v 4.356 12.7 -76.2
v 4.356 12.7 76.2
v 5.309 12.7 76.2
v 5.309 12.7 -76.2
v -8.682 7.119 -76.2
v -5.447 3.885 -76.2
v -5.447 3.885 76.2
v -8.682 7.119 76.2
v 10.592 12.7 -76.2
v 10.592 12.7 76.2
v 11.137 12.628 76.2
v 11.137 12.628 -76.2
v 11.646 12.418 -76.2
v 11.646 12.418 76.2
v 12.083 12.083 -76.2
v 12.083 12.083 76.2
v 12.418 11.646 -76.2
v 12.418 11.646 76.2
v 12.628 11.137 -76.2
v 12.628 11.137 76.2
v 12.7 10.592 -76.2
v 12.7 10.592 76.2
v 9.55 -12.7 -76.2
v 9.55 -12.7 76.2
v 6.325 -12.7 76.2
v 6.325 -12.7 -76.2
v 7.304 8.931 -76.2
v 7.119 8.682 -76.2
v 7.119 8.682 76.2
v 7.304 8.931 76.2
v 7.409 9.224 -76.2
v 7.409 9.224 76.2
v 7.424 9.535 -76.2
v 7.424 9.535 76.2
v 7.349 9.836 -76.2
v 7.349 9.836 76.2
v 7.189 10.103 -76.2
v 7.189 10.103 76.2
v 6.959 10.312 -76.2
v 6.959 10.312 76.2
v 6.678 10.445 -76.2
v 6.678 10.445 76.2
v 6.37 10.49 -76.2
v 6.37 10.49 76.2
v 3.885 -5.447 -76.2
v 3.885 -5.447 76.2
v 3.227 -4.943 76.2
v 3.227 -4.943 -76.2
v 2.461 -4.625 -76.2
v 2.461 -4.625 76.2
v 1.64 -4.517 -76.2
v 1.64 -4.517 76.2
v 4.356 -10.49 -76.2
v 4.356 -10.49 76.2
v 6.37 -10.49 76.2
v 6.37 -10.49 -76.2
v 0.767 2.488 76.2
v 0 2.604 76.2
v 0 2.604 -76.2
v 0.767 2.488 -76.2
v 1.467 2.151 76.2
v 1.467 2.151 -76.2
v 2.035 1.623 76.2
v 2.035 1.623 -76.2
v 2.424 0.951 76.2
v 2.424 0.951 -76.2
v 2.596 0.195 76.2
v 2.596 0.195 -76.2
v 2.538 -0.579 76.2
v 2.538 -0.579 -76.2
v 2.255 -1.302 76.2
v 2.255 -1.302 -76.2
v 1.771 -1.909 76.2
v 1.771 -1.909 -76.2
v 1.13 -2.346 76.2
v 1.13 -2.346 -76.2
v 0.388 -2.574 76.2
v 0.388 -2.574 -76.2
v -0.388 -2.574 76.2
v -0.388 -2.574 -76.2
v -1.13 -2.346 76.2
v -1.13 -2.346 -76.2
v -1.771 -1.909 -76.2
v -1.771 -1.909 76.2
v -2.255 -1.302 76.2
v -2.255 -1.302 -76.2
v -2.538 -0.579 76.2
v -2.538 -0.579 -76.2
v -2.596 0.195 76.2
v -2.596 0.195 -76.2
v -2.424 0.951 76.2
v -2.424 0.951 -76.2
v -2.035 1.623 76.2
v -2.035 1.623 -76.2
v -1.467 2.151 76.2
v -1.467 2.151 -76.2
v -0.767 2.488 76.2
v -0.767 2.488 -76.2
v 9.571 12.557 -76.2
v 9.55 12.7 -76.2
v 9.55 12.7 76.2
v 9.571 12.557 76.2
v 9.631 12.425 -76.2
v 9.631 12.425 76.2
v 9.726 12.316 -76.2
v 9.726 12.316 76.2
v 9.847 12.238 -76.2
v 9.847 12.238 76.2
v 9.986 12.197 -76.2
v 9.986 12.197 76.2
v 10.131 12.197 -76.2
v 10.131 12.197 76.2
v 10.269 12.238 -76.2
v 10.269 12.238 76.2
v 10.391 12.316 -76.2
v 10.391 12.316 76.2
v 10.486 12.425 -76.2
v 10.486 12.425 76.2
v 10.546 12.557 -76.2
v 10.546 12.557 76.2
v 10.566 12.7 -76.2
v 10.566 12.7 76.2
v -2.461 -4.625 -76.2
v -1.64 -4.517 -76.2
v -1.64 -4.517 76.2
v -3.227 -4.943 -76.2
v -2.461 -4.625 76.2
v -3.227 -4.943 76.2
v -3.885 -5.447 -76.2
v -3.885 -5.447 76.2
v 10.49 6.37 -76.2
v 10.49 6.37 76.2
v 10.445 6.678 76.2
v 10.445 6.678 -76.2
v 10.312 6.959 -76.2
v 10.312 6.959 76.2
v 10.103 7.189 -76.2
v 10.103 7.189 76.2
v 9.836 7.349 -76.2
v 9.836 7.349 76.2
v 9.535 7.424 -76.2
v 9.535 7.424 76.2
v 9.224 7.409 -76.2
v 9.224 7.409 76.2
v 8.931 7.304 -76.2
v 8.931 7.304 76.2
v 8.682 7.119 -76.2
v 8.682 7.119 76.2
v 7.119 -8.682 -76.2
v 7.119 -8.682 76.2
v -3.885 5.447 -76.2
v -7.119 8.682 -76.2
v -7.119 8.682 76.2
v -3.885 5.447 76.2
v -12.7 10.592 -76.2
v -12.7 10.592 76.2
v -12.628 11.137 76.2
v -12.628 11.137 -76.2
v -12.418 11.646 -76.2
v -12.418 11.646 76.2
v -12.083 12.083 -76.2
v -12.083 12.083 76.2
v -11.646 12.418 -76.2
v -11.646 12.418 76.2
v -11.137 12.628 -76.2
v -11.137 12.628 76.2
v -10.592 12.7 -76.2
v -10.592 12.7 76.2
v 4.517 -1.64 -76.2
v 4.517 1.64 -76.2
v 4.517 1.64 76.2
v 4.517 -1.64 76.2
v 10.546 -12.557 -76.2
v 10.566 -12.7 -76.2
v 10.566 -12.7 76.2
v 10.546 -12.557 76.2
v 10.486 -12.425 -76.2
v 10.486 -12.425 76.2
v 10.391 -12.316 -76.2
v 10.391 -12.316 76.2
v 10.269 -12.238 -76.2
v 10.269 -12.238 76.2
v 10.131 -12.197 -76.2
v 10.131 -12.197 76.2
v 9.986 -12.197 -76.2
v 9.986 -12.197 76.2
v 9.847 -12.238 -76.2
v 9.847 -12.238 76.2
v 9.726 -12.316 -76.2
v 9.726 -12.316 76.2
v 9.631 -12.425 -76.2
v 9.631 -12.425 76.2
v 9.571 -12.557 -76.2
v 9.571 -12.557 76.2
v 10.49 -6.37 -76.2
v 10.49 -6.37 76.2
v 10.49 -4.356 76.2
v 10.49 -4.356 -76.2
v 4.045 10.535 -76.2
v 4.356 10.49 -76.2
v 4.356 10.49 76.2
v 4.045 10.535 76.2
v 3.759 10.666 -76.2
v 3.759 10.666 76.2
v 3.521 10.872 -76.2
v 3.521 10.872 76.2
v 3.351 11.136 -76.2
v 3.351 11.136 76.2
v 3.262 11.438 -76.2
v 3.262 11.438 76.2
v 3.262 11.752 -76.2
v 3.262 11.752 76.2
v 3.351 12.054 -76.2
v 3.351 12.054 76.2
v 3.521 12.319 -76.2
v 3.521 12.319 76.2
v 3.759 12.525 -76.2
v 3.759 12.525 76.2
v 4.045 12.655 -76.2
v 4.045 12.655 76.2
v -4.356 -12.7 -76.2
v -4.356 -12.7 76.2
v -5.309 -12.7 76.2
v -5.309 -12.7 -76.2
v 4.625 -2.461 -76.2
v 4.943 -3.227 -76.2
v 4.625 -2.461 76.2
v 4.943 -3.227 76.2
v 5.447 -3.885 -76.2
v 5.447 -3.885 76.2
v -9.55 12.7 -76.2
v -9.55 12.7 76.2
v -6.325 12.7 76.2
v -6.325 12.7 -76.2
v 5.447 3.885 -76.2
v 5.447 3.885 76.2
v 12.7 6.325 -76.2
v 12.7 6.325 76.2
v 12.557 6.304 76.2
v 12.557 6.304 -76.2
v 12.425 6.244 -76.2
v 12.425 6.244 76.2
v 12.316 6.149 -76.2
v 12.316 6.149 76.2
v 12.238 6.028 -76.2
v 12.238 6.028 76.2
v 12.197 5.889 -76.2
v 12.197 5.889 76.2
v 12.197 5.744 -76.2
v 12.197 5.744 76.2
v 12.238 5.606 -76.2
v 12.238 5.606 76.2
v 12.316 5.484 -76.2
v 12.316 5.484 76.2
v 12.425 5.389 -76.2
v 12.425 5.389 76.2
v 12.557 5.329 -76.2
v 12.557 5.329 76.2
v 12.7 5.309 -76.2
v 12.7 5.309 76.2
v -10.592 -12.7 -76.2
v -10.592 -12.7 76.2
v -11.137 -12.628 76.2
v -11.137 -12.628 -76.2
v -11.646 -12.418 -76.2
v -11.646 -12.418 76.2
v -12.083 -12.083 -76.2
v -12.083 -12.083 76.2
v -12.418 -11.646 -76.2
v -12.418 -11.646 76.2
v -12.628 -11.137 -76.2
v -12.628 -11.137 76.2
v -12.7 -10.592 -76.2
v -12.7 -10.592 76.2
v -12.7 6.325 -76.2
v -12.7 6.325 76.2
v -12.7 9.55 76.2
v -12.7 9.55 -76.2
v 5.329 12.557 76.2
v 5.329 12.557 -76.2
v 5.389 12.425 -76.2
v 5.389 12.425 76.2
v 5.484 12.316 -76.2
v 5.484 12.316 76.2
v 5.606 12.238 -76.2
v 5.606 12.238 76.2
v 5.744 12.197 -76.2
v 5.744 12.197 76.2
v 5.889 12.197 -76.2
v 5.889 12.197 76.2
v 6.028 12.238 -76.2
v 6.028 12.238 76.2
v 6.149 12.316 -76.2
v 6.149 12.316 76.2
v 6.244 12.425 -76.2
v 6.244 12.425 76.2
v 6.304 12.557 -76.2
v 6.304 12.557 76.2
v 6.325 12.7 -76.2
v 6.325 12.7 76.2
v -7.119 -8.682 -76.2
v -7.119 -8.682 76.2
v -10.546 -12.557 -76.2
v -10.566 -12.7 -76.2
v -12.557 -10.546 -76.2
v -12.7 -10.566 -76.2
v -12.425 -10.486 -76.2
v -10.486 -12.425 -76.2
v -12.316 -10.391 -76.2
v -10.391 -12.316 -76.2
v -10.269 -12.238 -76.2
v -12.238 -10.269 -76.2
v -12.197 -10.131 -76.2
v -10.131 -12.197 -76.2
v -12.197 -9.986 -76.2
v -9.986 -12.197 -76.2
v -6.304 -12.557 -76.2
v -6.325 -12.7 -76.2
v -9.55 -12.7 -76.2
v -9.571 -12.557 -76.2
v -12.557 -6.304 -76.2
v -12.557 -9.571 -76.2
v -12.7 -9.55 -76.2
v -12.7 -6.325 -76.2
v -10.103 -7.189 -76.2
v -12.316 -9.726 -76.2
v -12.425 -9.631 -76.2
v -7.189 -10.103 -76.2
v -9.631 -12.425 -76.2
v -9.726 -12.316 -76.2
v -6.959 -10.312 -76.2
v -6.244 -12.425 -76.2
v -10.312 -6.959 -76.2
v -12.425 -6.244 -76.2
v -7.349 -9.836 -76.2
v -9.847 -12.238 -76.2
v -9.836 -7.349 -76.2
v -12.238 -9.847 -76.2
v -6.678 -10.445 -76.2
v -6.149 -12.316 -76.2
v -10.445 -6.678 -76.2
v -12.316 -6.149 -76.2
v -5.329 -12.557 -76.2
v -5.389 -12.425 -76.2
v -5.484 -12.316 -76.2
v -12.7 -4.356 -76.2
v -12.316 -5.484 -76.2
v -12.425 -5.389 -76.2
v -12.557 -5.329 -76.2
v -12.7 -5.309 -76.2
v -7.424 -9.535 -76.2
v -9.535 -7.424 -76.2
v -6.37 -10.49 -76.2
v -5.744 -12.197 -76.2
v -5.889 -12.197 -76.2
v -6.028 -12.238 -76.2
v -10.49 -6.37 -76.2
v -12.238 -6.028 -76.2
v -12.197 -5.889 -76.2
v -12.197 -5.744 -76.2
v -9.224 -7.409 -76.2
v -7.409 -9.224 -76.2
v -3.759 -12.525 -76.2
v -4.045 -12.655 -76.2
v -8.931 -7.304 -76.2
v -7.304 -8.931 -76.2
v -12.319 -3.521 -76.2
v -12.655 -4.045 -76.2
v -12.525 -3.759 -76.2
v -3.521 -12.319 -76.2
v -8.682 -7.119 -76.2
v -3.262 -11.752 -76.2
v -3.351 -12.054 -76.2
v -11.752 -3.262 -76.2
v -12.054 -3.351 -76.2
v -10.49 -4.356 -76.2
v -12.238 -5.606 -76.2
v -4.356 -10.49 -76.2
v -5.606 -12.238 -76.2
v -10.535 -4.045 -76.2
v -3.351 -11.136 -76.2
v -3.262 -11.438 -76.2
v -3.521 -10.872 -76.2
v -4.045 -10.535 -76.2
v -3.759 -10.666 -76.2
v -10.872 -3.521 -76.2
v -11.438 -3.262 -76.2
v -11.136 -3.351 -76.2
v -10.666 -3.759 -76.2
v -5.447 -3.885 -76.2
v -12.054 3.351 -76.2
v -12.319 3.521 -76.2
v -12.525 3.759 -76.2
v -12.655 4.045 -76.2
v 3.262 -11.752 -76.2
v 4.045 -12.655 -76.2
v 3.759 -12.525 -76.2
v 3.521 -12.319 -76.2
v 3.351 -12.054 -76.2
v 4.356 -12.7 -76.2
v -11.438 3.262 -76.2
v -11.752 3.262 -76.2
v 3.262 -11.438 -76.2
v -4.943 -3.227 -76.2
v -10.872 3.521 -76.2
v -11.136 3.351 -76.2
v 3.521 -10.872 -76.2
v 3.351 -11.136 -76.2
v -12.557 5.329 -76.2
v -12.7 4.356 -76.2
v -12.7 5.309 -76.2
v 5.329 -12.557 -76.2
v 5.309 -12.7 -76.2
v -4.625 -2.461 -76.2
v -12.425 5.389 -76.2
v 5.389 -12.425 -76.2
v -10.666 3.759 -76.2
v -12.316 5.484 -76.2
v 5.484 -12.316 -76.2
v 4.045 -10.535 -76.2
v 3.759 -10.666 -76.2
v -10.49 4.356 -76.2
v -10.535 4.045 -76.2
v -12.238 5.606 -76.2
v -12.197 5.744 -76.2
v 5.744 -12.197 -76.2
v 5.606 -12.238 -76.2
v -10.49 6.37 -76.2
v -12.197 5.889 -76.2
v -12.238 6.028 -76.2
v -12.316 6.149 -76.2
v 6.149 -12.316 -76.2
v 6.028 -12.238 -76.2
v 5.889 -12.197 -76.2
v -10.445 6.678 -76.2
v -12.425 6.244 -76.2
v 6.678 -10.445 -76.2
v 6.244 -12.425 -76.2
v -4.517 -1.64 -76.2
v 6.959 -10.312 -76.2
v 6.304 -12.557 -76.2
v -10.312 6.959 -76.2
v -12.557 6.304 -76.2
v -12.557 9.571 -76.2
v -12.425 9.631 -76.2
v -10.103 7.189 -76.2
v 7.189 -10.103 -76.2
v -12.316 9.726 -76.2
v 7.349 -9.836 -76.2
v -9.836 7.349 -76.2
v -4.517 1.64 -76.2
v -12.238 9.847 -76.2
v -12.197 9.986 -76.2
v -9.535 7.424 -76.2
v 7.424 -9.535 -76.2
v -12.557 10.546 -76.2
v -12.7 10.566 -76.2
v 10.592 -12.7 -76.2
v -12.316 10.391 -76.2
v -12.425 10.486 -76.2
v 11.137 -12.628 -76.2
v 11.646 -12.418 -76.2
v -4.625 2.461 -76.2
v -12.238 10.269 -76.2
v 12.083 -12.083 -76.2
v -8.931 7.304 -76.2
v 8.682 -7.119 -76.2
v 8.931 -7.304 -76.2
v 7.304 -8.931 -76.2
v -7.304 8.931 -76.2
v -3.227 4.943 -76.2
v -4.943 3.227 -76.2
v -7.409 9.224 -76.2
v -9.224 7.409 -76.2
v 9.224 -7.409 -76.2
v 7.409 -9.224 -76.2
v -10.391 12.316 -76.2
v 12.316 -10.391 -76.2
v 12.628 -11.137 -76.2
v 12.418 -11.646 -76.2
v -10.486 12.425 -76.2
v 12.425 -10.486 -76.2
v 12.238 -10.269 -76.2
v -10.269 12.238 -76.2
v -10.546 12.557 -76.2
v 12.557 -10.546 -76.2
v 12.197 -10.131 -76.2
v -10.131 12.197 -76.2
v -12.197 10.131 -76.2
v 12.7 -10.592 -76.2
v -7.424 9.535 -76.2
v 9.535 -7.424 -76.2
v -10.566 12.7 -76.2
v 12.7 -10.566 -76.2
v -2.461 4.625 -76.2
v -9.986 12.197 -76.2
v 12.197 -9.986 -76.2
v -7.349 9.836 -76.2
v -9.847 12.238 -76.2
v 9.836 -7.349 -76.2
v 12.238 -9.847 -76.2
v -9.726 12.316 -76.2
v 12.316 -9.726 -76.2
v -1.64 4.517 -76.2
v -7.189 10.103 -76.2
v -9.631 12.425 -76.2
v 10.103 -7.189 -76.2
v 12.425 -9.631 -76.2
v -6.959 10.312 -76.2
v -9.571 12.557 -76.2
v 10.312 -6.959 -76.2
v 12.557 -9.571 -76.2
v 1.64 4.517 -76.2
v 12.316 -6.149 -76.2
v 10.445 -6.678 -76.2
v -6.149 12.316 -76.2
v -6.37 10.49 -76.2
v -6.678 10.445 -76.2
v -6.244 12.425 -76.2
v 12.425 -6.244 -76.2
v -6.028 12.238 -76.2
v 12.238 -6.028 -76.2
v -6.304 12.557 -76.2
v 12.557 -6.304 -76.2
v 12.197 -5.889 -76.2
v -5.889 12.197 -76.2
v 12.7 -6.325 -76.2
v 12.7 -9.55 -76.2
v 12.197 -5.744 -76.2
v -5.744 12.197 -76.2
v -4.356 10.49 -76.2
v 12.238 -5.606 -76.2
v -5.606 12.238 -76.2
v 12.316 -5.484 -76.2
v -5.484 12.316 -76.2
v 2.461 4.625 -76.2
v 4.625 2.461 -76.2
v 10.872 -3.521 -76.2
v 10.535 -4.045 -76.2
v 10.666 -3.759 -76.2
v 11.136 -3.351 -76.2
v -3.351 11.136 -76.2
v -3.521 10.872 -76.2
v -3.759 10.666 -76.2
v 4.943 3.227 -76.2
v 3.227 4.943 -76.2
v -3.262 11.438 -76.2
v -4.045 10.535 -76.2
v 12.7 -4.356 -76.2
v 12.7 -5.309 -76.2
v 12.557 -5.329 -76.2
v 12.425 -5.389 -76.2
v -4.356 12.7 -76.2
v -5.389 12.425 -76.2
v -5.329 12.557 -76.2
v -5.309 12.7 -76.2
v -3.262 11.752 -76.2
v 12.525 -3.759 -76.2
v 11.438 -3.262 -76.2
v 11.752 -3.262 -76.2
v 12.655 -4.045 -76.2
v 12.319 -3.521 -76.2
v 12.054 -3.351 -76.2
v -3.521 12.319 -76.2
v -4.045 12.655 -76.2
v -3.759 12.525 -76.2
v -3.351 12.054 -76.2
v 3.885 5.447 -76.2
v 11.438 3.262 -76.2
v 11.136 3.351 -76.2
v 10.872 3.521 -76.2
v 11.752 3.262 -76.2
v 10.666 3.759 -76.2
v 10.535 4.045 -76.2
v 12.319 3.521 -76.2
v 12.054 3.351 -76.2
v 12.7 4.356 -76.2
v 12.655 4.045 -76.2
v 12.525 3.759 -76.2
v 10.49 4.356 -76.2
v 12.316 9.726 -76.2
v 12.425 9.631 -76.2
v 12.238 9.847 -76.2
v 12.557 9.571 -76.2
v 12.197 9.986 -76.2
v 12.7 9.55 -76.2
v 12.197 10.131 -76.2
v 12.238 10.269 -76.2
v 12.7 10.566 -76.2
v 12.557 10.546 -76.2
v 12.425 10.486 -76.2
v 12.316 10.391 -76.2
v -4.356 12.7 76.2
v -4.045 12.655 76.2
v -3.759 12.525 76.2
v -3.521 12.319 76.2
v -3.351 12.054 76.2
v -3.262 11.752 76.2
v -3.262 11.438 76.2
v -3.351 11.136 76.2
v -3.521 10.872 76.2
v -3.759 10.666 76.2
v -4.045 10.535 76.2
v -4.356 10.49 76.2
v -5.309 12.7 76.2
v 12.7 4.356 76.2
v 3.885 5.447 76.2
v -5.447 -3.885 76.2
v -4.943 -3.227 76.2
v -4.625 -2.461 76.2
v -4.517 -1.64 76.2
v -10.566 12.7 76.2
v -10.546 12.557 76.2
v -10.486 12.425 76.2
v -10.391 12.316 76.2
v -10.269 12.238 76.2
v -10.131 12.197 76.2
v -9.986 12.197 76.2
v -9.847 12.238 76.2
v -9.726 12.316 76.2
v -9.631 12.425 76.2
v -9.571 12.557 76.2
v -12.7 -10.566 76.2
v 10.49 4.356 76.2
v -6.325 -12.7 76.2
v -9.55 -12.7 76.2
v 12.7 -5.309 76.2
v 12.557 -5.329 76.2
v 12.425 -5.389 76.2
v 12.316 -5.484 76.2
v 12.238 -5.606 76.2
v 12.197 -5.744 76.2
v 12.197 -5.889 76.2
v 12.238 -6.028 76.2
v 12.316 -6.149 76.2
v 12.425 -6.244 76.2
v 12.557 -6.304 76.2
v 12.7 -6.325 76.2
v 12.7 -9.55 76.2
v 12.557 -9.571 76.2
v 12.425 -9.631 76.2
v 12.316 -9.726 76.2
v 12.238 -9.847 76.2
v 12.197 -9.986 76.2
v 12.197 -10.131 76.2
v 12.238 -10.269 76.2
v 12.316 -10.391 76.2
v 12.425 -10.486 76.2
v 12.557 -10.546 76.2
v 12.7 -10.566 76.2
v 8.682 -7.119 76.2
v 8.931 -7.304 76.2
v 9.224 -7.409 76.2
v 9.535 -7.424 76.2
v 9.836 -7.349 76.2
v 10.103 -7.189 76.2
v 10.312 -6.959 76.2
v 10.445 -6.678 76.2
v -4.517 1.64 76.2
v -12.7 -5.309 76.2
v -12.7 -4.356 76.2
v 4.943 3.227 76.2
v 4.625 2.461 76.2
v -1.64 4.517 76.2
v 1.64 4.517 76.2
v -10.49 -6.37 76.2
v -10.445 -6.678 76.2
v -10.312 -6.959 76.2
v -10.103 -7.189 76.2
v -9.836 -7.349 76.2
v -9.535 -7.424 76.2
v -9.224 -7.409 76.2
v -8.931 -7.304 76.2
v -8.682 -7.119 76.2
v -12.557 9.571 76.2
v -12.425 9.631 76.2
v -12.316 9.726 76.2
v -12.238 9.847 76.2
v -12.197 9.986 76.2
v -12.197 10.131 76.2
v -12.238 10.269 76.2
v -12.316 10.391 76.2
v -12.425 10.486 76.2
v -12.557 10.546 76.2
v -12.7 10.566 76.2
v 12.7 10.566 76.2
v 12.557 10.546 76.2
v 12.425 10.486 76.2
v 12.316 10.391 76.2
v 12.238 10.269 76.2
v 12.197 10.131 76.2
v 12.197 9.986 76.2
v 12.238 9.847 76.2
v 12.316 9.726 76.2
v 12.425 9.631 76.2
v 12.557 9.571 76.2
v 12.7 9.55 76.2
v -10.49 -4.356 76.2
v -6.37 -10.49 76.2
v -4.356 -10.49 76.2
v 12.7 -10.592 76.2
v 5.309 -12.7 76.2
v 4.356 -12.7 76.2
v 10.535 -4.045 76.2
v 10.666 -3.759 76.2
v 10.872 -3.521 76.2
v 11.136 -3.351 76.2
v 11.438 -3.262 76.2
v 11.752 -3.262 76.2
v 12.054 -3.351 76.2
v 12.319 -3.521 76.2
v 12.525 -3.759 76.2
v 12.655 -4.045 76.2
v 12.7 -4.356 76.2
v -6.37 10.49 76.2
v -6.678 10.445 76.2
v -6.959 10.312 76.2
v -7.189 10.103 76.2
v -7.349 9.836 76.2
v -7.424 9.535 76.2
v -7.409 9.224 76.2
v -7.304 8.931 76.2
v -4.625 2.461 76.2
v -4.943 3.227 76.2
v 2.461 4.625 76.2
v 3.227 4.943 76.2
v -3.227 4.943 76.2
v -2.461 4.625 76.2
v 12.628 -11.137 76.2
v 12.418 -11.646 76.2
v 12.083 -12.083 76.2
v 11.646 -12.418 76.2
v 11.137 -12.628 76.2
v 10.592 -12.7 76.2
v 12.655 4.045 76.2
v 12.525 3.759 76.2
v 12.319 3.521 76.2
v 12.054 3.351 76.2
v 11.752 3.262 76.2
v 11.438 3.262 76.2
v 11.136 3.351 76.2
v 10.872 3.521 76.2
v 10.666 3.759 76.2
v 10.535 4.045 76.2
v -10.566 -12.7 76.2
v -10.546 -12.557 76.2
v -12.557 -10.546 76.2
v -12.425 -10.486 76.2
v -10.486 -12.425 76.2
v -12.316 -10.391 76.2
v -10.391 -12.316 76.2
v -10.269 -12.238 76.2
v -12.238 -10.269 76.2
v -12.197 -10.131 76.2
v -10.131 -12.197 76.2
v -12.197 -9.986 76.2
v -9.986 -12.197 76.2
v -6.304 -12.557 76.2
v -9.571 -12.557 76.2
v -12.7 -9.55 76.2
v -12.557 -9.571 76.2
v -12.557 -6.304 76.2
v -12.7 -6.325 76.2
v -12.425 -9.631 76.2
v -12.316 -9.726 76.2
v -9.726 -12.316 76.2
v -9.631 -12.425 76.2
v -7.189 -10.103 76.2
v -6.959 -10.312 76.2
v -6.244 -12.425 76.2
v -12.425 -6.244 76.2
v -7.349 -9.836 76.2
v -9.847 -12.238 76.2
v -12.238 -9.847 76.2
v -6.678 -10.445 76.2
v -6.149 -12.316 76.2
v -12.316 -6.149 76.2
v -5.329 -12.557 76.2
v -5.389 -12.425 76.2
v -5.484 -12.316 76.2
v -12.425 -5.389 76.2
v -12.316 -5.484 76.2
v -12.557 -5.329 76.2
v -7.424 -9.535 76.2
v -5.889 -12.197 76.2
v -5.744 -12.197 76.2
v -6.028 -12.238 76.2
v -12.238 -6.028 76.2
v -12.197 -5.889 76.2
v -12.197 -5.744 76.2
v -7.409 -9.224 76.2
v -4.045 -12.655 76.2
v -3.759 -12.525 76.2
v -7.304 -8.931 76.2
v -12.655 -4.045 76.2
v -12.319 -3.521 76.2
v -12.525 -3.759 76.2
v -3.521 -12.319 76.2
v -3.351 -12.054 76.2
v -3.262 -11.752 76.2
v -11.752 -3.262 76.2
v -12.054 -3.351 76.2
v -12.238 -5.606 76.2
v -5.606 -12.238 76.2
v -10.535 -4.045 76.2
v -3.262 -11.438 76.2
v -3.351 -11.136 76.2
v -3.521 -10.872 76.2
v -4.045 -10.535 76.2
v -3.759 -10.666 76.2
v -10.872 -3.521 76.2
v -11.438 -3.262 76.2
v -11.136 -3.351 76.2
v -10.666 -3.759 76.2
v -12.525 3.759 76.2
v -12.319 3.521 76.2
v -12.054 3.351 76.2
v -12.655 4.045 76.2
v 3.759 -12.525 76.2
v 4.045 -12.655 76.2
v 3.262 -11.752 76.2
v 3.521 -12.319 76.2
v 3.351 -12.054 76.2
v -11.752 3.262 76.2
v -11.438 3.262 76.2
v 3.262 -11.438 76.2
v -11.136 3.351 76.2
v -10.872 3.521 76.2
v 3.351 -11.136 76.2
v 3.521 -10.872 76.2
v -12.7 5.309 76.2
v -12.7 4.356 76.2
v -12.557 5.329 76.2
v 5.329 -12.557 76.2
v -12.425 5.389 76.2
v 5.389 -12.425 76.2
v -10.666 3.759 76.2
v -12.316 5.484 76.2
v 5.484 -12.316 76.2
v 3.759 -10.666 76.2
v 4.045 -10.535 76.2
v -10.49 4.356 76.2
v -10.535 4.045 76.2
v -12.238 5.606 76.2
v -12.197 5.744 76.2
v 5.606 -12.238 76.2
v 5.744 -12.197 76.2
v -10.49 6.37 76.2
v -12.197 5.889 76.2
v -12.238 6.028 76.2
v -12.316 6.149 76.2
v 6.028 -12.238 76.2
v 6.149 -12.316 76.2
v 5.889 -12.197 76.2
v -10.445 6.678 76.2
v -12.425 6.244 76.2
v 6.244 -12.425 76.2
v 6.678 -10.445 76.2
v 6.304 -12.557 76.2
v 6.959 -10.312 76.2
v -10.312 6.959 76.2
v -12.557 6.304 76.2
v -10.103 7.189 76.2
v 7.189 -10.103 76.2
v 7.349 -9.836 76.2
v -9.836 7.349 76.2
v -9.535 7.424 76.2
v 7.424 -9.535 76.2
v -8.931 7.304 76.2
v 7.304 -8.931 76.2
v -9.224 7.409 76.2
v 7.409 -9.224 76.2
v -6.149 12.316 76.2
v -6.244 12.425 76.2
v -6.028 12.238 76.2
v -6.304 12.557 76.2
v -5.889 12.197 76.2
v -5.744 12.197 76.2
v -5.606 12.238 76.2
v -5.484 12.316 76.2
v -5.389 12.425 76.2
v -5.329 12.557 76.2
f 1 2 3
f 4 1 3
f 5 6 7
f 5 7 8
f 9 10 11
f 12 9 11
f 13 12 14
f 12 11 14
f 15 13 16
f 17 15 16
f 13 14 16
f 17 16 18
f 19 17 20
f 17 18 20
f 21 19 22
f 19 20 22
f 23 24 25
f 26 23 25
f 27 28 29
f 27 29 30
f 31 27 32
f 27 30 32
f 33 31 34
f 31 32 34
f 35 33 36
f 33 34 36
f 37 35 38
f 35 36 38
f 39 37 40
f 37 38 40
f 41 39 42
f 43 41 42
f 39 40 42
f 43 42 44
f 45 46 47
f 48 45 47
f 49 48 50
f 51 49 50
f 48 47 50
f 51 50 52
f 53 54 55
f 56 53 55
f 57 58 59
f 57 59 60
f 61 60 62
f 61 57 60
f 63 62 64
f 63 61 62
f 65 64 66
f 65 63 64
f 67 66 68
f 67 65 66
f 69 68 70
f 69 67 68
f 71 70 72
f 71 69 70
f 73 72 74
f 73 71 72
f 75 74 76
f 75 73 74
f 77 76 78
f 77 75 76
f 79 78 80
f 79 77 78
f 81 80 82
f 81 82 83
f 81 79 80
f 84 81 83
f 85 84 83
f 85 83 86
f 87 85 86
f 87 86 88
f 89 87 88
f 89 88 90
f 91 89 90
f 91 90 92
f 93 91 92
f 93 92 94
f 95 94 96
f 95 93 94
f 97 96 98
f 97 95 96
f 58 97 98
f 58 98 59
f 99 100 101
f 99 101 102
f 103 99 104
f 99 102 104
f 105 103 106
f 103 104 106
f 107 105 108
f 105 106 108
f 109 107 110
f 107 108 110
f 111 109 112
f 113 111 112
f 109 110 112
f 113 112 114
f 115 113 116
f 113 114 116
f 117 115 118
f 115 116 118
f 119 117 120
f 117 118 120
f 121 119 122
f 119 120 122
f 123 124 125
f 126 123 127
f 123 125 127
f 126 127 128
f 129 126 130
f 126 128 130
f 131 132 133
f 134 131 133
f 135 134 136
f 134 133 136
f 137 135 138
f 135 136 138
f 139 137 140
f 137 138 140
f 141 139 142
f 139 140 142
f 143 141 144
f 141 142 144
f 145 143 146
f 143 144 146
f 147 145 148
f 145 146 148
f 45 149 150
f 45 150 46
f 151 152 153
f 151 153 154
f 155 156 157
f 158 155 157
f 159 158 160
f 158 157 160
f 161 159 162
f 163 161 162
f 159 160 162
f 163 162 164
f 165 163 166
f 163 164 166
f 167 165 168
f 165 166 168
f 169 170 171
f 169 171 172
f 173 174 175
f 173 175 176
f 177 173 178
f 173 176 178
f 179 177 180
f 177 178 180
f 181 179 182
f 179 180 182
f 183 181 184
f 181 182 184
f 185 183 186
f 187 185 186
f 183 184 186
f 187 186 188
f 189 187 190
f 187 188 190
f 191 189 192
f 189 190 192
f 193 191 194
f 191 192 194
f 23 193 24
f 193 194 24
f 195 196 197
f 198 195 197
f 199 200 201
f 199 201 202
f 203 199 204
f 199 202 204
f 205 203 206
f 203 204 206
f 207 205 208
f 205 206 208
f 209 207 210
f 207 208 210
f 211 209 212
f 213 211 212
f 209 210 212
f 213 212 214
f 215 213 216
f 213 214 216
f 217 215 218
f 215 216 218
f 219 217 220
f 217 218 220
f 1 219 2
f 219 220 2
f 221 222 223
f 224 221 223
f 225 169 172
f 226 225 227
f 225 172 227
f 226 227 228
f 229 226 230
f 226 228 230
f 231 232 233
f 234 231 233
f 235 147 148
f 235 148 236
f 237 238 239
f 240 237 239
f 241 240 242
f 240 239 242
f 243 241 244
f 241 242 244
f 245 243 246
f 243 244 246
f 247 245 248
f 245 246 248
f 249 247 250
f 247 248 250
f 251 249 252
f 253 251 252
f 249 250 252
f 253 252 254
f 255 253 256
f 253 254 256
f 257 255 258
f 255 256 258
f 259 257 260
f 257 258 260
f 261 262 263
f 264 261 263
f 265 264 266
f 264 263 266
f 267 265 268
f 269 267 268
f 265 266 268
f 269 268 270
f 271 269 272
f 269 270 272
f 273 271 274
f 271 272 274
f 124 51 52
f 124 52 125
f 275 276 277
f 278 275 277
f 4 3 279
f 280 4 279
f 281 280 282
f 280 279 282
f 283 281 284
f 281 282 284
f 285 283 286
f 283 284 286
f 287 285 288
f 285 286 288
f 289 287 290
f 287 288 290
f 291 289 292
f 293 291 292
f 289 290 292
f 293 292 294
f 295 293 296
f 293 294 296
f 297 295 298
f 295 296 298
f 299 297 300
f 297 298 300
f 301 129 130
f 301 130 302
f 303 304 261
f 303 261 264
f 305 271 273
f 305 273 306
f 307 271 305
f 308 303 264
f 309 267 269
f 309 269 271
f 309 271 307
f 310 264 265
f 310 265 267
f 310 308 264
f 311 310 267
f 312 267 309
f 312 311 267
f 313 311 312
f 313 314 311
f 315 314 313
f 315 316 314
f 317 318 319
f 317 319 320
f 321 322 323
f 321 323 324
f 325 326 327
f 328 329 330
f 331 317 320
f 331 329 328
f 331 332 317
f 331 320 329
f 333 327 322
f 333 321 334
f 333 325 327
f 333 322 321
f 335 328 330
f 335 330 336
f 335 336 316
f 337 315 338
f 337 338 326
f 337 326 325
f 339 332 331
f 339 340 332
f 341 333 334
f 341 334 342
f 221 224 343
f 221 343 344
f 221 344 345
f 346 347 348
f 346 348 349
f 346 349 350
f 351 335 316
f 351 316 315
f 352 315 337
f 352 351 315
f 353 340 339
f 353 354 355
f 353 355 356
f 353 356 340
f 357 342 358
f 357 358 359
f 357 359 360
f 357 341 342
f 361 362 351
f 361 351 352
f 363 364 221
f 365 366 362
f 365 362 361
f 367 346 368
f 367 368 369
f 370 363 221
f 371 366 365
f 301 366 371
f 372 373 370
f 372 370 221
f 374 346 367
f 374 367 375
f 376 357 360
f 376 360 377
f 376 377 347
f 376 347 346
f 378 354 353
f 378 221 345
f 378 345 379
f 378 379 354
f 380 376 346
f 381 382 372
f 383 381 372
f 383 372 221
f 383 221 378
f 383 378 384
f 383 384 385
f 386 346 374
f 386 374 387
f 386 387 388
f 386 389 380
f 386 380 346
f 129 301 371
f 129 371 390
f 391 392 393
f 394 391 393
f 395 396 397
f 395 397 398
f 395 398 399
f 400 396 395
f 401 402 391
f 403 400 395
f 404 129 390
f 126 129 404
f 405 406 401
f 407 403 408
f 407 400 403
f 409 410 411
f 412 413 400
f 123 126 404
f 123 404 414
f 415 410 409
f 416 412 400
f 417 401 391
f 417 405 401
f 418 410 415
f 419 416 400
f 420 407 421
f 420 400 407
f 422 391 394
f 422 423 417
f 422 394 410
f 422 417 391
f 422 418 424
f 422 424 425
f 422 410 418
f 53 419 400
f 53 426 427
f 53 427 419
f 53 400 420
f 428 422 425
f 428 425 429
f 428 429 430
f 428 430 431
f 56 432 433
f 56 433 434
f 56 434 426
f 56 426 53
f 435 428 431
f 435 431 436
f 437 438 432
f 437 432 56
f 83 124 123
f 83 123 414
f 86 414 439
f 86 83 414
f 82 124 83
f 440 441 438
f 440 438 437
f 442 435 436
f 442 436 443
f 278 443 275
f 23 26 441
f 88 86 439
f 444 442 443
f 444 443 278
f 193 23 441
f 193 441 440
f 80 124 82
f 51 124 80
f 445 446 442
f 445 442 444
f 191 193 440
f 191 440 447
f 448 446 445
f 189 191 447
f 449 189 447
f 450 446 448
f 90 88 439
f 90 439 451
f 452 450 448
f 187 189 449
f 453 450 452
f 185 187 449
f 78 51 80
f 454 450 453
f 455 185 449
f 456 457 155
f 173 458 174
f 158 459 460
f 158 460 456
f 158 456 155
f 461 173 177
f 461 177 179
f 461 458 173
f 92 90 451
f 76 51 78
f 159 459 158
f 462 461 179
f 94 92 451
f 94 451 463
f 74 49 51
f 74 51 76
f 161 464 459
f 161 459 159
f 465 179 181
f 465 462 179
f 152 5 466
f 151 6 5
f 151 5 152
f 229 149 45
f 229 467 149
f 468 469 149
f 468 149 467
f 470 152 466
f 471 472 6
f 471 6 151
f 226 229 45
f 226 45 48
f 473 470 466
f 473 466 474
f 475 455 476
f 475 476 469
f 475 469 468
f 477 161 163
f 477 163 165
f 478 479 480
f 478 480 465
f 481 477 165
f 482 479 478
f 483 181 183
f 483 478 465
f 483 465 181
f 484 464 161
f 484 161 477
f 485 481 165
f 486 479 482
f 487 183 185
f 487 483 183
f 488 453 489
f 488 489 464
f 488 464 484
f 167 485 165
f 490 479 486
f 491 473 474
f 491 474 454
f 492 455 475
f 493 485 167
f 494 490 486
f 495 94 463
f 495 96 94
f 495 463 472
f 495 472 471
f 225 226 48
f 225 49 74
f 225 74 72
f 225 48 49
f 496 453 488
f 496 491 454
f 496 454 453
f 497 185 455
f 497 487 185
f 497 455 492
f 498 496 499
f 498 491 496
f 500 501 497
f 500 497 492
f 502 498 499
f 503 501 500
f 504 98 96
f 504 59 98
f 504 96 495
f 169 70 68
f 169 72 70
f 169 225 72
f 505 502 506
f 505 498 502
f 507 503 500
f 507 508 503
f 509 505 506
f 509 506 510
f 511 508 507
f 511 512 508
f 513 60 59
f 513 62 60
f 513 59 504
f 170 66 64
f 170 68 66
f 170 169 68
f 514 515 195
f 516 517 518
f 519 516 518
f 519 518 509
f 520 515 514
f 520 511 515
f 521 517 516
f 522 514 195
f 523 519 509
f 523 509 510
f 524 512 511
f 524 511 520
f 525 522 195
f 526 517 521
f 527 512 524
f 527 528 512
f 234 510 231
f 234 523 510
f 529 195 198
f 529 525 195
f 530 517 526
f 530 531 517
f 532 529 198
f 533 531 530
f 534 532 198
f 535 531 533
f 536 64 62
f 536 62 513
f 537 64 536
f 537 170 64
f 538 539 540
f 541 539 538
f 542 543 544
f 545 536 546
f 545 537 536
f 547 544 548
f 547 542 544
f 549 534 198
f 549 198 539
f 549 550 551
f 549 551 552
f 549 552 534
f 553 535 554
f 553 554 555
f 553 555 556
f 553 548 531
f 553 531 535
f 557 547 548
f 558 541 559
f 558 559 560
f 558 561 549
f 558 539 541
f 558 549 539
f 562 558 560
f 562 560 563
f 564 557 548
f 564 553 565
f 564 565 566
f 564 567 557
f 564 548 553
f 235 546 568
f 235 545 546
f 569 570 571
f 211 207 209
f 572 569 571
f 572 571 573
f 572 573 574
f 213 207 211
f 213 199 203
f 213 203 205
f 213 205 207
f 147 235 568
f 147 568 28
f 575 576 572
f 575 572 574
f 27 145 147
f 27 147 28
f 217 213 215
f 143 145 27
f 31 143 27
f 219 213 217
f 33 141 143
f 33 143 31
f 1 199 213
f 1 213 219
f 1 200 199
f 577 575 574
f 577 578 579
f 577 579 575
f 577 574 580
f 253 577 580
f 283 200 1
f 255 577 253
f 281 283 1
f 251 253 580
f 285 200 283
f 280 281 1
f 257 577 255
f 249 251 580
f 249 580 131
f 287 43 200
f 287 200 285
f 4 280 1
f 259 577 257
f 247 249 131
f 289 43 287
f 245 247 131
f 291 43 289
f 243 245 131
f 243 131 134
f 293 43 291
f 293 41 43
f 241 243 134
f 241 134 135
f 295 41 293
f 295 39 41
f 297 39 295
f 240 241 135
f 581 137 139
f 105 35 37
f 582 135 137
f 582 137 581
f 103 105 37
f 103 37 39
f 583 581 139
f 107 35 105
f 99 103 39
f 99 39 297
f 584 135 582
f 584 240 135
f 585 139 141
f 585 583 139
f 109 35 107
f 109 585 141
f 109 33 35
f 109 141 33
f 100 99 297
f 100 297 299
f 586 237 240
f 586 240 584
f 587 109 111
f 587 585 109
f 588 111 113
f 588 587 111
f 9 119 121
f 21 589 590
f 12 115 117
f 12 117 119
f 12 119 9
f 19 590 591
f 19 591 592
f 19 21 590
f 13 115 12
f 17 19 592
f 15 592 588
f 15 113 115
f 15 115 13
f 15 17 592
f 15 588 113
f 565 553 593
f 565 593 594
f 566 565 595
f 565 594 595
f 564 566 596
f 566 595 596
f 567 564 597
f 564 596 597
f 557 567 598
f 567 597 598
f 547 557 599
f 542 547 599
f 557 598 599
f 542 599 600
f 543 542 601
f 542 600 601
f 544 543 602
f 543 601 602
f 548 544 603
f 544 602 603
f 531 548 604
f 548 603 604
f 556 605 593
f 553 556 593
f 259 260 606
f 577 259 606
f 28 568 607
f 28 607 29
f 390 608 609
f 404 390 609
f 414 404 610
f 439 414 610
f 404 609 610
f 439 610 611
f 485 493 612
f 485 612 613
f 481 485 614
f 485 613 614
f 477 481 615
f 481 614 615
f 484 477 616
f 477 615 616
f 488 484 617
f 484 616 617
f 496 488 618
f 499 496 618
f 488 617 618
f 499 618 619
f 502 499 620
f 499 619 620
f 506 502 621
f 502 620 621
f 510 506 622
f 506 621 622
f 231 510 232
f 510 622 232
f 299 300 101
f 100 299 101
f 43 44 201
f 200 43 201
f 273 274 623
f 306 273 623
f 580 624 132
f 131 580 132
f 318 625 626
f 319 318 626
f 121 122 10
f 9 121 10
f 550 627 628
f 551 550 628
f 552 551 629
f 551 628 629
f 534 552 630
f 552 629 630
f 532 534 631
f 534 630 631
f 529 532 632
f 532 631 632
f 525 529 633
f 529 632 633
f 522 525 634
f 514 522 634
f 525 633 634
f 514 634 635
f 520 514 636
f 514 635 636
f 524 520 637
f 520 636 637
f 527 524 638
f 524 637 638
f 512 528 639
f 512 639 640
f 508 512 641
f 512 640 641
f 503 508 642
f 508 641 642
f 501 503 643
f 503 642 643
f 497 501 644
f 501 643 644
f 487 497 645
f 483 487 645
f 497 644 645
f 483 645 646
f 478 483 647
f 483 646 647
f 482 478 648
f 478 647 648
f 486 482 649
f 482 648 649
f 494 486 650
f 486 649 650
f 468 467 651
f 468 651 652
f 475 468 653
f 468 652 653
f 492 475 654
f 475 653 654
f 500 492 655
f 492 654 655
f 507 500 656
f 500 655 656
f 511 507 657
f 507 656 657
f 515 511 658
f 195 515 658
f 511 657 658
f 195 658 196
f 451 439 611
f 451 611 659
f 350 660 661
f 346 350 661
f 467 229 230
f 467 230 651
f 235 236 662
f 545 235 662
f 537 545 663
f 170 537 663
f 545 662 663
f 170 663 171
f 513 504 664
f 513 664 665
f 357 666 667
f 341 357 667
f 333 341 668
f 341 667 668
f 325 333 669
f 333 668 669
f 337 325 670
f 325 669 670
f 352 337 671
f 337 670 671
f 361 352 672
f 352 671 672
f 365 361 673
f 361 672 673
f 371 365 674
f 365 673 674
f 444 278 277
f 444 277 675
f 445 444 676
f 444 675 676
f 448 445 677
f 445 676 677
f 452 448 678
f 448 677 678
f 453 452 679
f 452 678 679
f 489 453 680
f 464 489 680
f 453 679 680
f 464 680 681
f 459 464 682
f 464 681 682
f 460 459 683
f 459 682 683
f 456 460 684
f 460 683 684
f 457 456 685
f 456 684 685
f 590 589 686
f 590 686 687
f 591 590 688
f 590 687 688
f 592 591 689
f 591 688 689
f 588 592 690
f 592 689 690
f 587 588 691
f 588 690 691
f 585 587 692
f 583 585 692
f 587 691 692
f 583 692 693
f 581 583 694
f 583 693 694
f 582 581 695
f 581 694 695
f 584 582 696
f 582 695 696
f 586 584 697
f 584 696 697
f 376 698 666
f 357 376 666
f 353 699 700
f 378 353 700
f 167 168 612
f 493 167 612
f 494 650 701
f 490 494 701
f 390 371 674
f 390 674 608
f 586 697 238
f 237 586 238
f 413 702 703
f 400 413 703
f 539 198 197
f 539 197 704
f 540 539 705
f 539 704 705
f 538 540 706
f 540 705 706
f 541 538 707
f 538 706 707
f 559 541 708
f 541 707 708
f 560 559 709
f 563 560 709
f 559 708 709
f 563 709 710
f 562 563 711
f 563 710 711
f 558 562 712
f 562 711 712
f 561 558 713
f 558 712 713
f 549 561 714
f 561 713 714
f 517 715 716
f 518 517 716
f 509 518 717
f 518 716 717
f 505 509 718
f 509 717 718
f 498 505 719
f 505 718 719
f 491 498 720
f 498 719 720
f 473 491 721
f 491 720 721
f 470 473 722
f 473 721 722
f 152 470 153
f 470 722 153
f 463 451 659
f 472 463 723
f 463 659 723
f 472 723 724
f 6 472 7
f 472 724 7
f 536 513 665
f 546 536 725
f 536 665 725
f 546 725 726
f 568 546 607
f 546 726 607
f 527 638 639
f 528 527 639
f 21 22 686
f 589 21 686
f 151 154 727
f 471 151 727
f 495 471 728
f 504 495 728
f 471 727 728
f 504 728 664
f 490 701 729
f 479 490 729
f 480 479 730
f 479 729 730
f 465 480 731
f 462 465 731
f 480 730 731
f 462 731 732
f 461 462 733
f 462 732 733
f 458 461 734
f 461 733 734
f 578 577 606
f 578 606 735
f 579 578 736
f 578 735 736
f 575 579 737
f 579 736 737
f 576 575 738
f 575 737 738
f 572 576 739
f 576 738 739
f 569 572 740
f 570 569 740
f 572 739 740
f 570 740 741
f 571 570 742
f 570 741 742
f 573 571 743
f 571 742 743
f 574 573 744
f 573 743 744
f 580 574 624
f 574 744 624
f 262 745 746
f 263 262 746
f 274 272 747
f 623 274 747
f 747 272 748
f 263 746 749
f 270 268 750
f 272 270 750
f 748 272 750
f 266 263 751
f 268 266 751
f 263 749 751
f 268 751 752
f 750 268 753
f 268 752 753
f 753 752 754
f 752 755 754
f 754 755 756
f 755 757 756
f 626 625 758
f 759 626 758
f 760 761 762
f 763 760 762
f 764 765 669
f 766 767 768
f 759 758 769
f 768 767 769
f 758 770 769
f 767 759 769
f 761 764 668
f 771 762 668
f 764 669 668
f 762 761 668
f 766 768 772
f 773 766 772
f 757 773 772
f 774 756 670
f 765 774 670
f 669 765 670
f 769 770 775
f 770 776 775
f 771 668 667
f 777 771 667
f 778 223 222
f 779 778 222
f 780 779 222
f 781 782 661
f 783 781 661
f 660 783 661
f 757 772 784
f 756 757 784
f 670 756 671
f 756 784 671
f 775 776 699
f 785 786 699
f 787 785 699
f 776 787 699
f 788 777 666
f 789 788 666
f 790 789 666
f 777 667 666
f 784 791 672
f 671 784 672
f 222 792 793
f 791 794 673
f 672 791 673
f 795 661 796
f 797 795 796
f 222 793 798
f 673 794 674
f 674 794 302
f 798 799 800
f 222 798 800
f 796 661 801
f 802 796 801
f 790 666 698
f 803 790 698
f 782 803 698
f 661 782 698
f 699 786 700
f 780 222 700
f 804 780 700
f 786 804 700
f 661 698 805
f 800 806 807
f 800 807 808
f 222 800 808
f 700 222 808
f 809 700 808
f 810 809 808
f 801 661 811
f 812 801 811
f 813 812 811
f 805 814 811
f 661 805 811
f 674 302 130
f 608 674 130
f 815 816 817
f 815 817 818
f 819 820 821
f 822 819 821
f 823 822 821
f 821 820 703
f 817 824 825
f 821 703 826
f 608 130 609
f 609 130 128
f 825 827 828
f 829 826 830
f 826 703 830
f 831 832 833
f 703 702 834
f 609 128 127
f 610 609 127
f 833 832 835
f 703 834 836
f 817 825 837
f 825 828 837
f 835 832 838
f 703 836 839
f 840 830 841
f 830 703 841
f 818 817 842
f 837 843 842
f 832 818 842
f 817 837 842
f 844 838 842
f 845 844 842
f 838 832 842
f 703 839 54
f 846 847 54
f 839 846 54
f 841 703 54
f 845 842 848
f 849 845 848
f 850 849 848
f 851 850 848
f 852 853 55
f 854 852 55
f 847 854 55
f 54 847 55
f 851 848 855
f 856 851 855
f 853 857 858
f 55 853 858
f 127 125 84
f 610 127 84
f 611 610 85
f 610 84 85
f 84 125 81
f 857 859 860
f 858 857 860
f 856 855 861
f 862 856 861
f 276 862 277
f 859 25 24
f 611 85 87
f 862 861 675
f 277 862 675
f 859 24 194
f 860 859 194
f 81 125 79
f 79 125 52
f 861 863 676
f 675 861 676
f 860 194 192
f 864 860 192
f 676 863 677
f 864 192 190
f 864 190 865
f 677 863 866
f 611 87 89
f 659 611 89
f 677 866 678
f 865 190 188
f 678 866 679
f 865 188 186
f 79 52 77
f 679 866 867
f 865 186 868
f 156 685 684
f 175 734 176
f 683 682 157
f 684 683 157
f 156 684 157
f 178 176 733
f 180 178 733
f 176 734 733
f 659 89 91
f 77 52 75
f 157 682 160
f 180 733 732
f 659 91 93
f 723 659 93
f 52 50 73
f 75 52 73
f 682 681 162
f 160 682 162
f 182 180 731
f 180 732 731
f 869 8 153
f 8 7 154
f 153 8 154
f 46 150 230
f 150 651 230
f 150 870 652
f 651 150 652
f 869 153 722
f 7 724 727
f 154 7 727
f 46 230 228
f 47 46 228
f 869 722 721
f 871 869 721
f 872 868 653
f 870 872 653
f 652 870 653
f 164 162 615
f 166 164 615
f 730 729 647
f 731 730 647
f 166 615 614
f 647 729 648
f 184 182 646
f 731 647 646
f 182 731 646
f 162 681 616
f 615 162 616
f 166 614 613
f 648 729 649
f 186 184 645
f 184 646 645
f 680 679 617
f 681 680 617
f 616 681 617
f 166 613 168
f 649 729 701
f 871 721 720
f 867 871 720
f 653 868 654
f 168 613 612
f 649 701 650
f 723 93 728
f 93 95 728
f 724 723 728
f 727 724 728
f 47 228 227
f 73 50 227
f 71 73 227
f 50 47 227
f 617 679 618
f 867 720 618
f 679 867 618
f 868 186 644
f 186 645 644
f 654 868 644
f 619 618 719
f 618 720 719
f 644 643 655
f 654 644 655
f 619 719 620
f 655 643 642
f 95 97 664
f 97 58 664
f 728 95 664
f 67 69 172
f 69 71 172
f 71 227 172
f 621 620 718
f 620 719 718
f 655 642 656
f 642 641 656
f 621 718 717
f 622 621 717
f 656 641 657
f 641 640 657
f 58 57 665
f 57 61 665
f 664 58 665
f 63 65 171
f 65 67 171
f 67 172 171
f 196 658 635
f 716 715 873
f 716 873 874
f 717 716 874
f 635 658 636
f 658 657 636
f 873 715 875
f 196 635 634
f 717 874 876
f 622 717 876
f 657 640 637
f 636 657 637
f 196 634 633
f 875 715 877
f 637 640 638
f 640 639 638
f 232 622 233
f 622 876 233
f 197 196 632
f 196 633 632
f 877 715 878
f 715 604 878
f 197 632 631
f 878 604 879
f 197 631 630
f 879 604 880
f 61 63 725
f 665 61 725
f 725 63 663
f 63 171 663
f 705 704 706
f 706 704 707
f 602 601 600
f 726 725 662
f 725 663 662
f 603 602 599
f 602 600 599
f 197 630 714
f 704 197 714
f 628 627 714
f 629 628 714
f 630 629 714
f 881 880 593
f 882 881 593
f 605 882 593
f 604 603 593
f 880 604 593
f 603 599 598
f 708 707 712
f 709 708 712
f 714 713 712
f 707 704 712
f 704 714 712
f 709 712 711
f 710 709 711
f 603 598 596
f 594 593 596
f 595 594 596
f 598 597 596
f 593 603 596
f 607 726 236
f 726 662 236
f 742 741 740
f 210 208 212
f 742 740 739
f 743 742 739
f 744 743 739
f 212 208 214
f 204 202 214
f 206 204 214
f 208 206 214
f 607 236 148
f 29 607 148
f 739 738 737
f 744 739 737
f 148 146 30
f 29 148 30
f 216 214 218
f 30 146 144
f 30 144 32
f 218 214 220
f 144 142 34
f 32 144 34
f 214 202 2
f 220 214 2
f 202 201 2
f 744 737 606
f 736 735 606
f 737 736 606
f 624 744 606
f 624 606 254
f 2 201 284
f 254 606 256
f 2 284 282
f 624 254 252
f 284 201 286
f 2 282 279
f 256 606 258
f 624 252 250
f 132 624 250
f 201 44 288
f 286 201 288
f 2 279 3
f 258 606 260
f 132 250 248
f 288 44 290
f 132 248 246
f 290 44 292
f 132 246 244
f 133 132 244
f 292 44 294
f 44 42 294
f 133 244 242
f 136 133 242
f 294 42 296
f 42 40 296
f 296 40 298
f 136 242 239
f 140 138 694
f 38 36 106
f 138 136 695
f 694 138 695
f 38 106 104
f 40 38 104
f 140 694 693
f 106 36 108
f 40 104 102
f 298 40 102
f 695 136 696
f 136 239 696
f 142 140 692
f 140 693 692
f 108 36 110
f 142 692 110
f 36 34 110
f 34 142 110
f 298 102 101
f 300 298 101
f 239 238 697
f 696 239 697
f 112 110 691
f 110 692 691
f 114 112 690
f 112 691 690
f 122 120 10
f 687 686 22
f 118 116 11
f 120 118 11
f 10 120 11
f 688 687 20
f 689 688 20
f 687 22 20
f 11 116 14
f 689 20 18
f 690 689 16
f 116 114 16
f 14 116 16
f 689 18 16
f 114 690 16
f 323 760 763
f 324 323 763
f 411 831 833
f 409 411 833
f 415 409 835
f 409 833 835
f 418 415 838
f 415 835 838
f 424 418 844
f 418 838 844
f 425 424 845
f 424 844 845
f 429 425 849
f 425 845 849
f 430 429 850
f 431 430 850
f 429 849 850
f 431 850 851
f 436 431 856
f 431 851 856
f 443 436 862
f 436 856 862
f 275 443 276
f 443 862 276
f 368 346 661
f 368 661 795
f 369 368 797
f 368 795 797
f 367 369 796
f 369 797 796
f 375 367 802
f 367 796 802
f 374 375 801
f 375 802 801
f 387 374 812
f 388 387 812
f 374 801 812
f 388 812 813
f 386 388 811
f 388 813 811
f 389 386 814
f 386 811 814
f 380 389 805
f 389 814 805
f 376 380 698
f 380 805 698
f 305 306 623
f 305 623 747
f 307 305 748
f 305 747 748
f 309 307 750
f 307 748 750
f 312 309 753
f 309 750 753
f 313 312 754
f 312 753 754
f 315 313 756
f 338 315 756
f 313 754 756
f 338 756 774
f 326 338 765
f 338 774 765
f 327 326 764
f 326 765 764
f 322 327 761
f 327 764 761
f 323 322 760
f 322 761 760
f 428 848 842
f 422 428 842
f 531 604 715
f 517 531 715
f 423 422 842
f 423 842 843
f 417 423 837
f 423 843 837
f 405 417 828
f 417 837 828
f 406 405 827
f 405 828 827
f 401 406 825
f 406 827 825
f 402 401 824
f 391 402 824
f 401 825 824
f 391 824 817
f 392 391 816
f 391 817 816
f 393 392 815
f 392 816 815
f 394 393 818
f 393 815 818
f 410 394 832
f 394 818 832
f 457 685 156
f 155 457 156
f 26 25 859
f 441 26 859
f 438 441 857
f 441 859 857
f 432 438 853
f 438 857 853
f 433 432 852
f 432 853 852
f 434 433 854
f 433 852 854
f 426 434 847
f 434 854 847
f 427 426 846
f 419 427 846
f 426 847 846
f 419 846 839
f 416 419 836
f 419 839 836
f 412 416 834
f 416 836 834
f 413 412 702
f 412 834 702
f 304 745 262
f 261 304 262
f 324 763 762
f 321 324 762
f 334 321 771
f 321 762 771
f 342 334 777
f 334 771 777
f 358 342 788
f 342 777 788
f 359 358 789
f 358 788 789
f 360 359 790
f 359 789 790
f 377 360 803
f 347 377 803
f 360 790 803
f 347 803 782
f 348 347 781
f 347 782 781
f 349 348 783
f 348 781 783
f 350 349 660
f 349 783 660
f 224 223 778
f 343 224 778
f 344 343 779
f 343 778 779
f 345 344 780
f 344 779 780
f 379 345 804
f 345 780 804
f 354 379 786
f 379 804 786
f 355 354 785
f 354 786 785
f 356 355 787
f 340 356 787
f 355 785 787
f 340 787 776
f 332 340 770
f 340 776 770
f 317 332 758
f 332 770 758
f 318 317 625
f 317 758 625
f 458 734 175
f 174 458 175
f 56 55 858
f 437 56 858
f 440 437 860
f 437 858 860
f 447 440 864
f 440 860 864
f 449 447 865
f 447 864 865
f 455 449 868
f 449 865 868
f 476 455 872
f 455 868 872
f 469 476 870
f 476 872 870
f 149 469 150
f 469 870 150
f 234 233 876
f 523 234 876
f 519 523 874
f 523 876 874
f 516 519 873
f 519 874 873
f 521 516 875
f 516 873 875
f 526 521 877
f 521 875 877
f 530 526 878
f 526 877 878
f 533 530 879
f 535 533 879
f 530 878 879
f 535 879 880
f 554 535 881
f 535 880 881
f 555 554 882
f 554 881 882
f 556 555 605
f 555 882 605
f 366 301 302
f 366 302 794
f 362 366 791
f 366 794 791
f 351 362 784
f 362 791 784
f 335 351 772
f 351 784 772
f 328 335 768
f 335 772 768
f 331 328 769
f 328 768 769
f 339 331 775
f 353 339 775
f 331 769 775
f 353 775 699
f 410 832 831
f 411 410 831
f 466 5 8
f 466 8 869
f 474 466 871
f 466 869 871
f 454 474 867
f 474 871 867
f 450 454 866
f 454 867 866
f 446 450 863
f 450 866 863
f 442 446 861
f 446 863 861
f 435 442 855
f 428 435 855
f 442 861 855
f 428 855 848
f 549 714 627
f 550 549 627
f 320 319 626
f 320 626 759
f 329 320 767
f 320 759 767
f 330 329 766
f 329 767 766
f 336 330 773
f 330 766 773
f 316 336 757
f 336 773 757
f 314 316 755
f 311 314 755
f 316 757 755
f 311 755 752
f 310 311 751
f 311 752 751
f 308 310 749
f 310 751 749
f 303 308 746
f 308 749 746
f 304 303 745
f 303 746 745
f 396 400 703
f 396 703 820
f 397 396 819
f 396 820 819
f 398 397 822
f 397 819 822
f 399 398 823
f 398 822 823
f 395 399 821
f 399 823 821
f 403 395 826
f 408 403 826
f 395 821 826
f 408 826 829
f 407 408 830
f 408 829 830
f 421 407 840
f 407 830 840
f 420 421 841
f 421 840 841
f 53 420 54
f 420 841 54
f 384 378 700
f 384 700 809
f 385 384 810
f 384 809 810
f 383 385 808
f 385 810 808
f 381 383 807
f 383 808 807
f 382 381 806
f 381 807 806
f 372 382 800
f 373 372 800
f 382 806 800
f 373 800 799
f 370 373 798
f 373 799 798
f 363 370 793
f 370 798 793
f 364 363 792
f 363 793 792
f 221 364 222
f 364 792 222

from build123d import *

# Parameters (mm, degrees)
SKETCH11_R              = 2.6035
FRACTIONAL_1010_1_DEPTH = 152.4


with BuildPart() as part:
    # Sketch11 → Fractional 1010(1) (new body)
    with BuildSketch(Plane.YX.offset(-76.2)):
        with BuildLine():
            Line((10.5918, 12.7), (10.5664, 12.7))
            ThreePointArc((10.5664, 12.7), (10.0584, 12.192), (9.5504, 12.7))
            Line((9.5504, 12.7), (6.3246, 12.7))
            ThreePointArc((6.3246, 12.7), (5.8166, 12.192), (5.3086, 12.7))
            Line((5.3086, 12.7), (4.3561, 12.7))
            ThreePointArc((4.3561, 12.7), (3.2512, 11.5951), (4.3561, 10.4902))
            Line((4.3561, 10.4902), (6.370083786, 10.4902))
            ThreePointArc((6.370083786, 10.4902), (7.348856743, 9.836204819), (7.119204175, 8.681663397))
            Line((7.119204175, 8.681663397), (3.88464389, 5.447103113))
            ThreePointArc((3.88464389, 5.447103113), (2.854599758, 4.758849627), (1.63957986, 4.517167143))
            Line((1.63957986, 4.517167143), (-1.63957986, 4.517167143))
            ThreePointArc((-1.63957986, 4.517167143), (-2.854599758, 4.758849627), (-3.88464389, 5.447103113))
            Line((-3.88464389, 5.447103113), (-7.119204175, 8.681663397))
            ThreePointArc((-7.119204175, 8.681663397), (-7.348856743, 9.836204819), (-6.370083786, 10.4902))
            Line((-6.370083786, 10.4902), (-4.3561, 10.4902))
            ThreePointArc((-4.3561, 10.4902), (-3.2512, 11.5951), (-4.3561, 12.7))
            Line((-4.3561, 12.7), (-5.3086, 12.7))
            ThreePointArc((-5.3086, 12.7), (-5.8166, 12.192), (-6.3246, 12.7))
            Line((-6.3246, 12.7), (-9.5504, 12.7))
            ThreePointArc((-9.5504, 12.7), (-10.0584, 12.192), (-10.5664, 12.7))
            Line((-10.5664, 12.7), (-10.5918, 12.7))
            ThreePointArc((-10.5918, 12.7), (-12.082522516, 12.082522516), (-12.7, 10.5918))
            Line((-12.7, 10.5918), (-12.7, 10.5664))
            ThreePointArc((-12.7, 10.5664), (-12.192, 10.0584), (-12.7, 9.5504))
            Line((-12.7, 9.5504), (-12.7, 6.3246))
            ThreePointArc((-12.7, 6.3246), (-12.192, 5.8166), (-12.7, 5.3086))
            Line((-12.7, 5.3086), (-12.7, 4.3561))
            ThreePointArc((-12.7, 4.3561), (-11.5951, 3.2512), (-10.4902, 4.3561))
            Line((-10.4902, 4.3561), (-10.4902, 6.370083786))
            ThreePointArc((-10.4902, 6.370083786), (-9.836204819, 7.348856743), (-8.681663397, 7.119204175))
            Line((-8.681663397, 7.119204175), (-5.447103113, 3.88464389))
            ThreePointArc((-5.447103113, 3.88464389), (-4.758849627, 2.854599758), (-4.517167143, 1.63957986))
            Line((-4.517167143, 1.63957986), (-4.517167143, -1.63957986))
            ThreePointArc((-4.517167143, -1.63957986), (-4.758849627, -2.854599758), (-5.447103113, -3.88464389))
            Line((-5.447103113, -3.88464389), (-8.681663397, -7.119204175))
            ThreePointArc((-8.681663397, -7.119204175), (-9.836204819, -7.348856743), (-10.4902, -6.370083786))
            Line((-10.4902, -6.370083786), (-10.4902, -4.3561))
            ThreePointArc((-10.4902, -4.3561), (-11.5951, -3.2512), (-12.7, -4.3561))
            Line((-12.7, -4.3561), (-12.7, -5.3086))
            ThreePointArc((-12.7, -5.3086), (-12.192, -5.8166), (-12.7, -6.3246))
            Line((-12.7, -6.3246), (-12.7, -9.5504))
            ThreePointArc((-12.7, -9.5504), (-12.192, -10.0584), (-12.7, -10.5664))
            Line((-12.7, -10.5664), (-12.7, -10.5918))
            ThreePointArc((-12.7, -10.5918), (-12.082522516, -12.082522516), (-10.5918, -12.7))
            Line((-10.5918, -12.7), (-10.5664, -12.7))
            ThreePointArc((-10.5664, -12.7), (-10.0584, -12.192), (-9.5504, -12.7))
            Line((-9.5504, -12.7), (-6.3246, -12.7))
            ThreePointArc((-6.3246, -12.7), (-5.8166, -12.192), (-5.3086, -12.7))
            Line((-5.3086, -12.7), (-4.3561, -12.7))
            ThreePointArc((-4.3561, -12.7), (-3.2512, -11.5951), (-4.3561, -10.4902))
            Line((-4.3561, -10.4902), (-6.370083786, -10.4902))
            ThreePointArc((-6.370083786, -10.4902), (-7.348856743, -9.836204819), (-7.119204175, -8.681663397))
            Line((-7.119204175, -8.681663397), (-3.88464389, -5.447103113))
            ThreePointArc((-3.88464389, -5.447103113), (-2.854599758, -4.758849627), (-1.63957986, -4.517167143))
            Line((-1.63957986, -4.517167143), (1.63957986, -4.517167143))
            ThreePointArc((1.63957986, -4.517167143), (2.854599758, -4.758849627), (3.88464389, -5.447103113))
            Line((3.88464389, -5.447103113), (7.119204175, -8.681663397))
            ThreePointArc((7.119204175, -8.681663397), (7.348856743, -9.836204819), (6.370083786, -10.4902))
            Line((6.370083786, -10.4902), (4.3561, -10.4902))
            ThreePointArc((4.3561, -10.4902), (3.2512, -11.5951), (4.3561, -12.7))
            Line((4.3561, -12.7), (5.3086, -12.7))
            ThreePointArc((5.3086, -12.7), (5.8166, -12.192), (6.3246, -12.7))
            Line((6.3246, -12.7), (9.5504, -12.7))
            ThreePointArc((9.5504, -12.7), (10.0584, -12.192), (10.5664, -12.7))
            Line((10.5664, -12.7), (10.5918, -12.7))
            ThreePointArc((10.5918, -12.7), (12.082522516, -12.082522516), (12.7, -10.5918))
            Line((12.7, -10.5918), (12.7, -10.5664))
            ThreePointArc((12.7, -10.5664), (12.192, -10.0584), (12.7, -9.5504))
            Line((12.7, -9.5504), (12.7, -6.3246))
            ThreePointArc((12.7, -6.3246), (12.192, -5.8166), (12.7, -5.3086))
            Line((12.7, -5.3086), (12.7, -4.3561))
            ThreePointArc((12.7, -4.3561), (11.5951, -3.2512), (10.4902, -4.3561))
            Line((10.4902, -4.3561), (10.4902, -6.370083786))
            ThreePointArc((10.4902, -6.370083786), (9.836204819, -7.348856743), (8.681663397, -7.119204175))
            Line((8.681663397, -7.119204175), (5.447103113, -3.88464389))
            ThreePointArc((5.447103113, -3.88464389), (4.758849627, -2.854599758), (4.517167143, -1.63957986))
            Line((4.517167143, -1.63957986), (4.517167143, 1.63957986))
            ThreePointArc((4.517167143, 1.63957986), (4.758849627, 2.854599758), (5.447103113, 3.88464389))
            Line((5.447103113, 3.88464389), (8.681663397, 7.119204175))
            ThreePointArc((8.681663397, 7.119204175), (9.836204819, 7.348856743), (10.4902, 6.370083786))
            Line((10.4902, 6.370083786), (10.4902, 4.3561))
            ThreePointArc((10.4902, 4.3561), (11.5951, 3.2512), (12.7, 4.3561))
            Line((12.7, 4.3561), (12.7, 5.3086))
            ThreePointArc((12.7, 5.3086), (12.192, 5.8166), (12.7, 6.3246))
            Line((12.7, 6.3246), (12.7, 9.5504))
            ThreePointArc((12.7, 9.5504), (12.192, 10.0584), (12.7, 10.5664))
            Line((12.7, 10.5664), (12.7, 10.5918))
            ThreePointArc((12.7, 10.5918), (12.082522516, 12.082522516), (10.5918, 12.7))
        make_face()
        Circle(SKETCH11_R, mode=Mode.SUBTRACT)
    extrude(amount=FRACTIONAL_1010_1_DEPTH)


solid = part.part
